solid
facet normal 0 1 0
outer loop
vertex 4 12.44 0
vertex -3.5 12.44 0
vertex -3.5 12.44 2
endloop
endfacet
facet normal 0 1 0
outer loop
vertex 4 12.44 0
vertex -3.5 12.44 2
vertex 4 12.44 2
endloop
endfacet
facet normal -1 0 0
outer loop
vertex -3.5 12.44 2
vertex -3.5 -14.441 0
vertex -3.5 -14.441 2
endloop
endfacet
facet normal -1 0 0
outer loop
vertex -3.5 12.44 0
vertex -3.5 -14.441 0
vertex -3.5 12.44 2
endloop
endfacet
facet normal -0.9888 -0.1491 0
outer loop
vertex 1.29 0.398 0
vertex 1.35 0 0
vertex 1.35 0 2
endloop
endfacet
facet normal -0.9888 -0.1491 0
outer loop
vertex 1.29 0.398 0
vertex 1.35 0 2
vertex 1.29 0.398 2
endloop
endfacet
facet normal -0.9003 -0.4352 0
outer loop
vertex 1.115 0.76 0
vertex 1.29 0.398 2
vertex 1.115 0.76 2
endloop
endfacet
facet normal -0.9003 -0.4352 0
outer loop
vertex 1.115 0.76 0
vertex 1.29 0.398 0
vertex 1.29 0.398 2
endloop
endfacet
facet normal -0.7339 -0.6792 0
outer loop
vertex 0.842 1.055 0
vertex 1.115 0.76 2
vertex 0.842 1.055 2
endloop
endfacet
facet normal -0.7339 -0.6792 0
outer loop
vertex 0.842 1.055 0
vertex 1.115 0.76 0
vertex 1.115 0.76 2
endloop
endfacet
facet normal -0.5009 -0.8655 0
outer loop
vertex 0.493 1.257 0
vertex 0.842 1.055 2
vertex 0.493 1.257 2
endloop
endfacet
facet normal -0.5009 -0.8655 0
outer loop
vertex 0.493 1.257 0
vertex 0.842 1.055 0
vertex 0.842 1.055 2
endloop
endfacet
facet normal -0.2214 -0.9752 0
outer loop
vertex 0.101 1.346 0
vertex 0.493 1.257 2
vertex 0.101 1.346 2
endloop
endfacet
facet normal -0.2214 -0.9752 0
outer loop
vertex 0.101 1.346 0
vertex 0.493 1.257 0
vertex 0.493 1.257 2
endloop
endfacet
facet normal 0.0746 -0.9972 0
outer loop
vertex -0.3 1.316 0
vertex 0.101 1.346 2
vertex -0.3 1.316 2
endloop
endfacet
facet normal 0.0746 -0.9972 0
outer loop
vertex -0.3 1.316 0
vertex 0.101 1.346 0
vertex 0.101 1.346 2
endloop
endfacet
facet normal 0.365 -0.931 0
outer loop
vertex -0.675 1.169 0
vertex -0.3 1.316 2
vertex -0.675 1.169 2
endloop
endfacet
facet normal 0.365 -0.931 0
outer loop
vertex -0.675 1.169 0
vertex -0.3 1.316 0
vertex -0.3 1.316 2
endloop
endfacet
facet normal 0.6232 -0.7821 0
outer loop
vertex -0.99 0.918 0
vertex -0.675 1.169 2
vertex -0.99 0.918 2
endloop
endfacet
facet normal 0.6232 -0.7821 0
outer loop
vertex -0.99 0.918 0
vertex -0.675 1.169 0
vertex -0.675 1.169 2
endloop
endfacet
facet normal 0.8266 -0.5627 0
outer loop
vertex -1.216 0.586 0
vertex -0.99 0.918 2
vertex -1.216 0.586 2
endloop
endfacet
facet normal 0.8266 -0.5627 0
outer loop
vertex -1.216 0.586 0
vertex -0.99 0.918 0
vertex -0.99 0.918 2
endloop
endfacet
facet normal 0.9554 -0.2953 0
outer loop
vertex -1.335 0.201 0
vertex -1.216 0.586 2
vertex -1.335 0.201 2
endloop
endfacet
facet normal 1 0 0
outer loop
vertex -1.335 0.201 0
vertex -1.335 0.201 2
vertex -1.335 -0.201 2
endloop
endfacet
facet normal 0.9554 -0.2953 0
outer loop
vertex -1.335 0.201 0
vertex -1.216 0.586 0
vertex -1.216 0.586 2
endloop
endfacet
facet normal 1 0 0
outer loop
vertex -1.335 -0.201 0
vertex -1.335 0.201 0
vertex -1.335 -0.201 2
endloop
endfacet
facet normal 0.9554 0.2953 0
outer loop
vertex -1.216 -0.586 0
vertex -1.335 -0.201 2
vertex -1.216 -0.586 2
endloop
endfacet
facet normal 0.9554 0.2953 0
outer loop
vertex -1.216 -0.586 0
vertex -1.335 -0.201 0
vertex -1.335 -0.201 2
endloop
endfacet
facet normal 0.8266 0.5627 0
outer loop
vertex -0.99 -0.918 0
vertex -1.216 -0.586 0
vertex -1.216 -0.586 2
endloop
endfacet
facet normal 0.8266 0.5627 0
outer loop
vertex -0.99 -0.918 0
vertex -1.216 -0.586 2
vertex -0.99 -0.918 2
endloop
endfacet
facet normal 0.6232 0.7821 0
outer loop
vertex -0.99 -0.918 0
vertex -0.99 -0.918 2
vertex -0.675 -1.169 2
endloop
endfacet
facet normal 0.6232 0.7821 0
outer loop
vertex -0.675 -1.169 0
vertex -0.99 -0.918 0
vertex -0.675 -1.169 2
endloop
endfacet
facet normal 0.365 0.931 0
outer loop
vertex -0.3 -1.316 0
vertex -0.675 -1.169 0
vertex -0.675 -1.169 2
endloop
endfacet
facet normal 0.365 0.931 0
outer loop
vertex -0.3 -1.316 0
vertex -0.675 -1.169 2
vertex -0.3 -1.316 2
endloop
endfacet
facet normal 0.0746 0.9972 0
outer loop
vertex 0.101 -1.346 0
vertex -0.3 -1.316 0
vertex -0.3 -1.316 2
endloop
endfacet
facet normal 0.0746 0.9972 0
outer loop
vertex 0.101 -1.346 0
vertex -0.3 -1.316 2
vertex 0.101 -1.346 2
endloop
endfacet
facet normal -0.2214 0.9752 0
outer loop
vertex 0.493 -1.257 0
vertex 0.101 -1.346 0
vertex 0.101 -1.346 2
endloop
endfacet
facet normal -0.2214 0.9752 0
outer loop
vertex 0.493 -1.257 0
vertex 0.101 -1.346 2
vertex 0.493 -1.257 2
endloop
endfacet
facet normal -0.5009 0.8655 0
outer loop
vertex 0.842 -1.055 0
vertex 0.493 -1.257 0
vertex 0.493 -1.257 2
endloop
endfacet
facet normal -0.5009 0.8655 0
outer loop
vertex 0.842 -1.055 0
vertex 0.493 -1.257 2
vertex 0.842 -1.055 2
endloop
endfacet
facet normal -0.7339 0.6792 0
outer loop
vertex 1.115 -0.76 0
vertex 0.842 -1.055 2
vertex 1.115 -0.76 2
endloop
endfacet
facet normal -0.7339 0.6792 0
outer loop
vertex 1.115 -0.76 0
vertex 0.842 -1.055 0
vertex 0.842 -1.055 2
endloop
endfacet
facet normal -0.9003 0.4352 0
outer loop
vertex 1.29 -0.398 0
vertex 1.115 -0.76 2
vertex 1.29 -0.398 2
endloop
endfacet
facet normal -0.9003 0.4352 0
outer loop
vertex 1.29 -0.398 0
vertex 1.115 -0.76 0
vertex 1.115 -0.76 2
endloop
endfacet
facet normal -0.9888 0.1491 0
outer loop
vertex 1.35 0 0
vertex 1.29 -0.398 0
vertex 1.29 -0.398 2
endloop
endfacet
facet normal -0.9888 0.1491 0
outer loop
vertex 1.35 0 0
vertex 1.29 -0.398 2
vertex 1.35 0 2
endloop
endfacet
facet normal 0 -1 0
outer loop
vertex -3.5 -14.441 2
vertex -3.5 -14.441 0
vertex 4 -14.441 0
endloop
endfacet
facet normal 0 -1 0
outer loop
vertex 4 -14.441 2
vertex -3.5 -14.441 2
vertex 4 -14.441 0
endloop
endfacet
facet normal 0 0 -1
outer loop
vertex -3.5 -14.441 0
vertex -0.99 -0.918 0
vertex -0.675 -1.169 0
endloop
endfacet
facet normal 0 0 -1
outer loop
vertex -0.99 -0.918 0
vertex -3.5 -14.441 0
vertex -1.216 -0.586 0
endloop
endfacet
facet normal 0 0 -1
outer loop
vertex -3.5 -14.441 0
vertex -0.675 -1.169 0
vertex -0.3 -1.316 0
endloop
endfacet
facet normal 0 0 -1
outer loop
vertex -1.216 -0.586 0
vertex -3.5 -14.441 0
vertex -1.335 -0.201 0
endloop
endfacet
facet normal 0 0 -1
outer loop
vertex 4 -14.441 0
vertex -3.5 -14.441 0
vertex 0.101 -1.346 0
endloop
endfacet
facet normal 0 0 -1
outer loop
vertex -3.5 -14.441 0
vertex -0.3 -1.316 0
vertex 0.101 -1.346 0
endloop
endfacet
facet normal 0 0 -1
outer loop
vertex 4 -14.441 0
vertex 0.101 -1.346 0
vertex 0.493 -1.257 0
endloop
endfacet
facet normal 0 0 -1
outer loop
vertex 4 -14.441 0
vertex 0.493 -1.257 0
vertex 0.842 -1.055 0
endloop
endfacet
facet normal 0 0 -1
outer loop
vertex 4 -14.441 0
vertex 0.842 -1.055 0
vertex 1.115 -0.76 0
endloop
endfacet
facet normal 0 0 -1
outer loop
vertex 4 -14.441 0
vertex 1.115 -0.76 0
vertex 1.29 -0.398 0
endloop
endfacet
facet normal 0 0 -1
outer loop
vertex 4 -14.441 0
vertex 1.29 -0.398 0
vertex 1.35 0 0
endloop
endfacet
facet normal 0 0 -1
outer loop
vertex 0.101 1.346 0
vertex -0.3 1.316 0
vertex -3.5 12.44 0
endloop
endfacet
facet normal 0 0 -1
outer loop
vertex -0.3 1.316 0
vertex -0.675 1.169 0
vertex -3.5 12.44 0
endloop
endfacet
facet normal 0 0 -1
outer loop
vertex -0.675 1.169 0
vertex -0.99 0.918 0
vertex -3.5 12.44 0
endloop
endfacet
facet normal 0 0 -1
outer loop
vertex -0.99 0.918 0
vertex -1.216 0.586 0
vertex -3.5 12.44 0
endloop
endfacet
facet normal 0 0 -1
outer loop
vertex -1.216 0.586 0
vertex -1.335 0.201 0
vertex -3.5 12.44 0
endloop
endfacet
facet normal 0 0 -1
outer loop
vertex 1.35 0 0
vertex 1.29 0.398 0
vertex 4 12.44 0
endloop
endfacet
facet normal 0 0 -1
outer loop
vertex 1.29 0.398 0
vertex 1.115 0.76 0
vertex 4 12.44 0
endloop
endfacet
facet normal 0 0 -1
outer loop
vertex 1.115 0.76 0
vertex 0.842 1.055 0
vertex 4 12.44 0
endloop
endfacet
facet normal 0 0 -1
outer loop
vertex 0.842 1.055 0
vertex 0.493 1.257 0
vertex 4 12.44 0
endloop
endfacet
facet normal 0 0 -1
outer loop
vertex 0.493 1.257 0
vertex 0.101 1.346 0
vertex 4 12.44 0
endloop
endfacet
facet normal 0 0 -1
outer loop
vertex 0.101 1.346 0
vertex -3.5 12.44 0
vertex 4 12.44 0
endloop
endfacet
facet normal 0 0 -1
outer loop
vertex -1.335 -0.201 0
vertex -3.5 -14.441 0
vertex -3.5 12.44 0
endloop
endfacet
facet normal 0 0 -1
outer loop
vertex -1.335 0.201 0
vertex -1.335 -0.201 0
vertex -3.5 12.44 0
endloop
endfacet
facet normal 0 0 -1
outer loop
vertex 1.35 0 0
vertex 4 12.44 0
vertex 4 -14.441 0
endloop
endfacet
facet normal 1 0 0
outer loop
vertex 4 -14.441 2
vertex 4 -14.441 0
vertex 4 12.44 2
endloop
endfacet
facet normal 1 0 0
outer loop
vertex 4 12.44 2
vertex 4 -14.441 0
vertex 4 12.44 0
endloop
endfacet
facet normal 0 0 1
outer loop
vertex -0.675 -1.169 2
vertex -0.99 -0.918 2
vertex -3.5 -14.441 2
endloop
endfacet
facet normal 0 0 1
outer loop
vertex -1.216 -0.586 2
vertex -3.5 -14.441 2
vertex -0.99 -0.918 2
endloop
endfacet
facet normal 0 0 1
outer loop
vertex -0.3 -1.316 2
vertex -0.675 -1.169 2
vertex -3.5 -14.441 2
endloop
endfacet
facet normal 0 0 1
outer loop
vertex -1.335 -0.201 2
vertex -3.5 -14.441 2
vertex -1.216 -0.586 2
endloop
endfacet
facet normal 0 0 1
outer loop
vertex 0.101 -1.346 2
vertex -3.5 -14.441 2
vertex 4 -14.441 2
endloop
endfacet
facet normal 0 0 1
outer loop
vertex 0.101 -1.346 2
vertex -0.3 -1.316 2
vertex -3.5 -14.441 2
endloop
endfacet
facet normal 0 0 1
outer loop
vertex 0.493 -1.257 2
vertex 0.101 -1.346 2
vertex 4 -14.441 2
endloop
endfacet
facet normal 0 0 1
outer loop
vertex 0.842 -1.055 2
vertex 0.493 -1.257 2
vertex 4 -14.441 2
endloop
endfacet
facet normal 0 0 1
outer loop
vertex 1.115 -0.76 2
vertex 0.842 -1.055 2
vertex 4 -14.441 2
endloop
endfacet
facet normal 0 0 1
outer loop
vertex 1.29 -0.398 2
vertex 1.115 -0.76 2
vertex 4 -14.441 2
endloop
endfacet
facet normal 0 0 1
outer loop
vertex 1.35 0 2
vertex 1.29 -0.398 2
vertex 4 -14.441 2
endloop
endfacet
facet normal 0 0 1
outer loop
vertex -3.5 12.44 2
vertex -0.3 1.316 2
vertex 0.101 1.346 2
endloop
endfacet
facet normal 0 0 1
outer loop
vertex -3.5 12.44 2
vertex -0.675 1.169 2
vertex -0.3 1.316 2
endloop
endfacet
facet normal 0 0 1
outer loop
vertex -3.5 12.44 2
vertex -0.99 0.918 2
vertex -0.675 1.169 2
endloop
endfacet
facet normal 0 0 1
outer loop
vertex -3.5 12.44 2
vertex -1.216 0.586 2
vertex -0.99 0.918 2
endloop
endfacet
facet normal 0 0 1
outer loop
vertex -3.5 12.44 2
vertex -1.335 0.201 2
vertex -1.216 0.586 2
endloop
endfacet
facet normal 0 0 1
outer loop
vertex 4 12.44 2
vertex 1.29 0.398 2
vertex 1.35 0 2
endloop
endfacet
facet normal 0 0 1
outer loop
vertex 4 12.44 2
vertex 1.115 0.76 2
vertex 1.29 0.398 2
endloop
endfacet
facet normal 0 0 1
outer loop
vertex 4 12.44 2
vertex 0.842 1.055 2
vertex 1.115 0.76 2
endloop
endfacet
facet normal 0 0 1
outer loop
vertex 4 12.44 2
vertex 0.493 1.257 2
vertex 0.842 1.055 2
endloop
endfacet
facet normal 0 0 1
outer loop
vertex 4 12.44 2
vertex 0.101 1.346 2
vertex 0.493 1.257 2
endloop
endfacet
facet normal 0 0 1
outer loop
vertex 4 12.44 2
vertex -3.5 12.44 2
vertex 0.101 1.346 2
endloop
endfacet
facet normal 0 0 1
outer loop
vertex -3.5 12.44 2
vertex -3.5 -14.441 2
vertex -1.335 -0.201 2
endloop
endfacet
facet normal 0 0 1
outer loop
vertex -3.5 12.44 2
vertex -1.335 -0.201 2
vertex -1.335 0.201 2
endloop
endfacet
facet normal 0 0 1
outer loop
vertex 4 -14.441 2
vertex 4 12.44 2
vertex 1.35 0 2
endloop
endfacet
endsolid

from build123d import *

# Parameters (mm, degrees)
SKETCH1_W           = 7.5
SKETCH1_H           = 26.881
SKETCH1_R           = 1.35
BOSS_EXTRUDE1_DEPTH = 2


with BuildPart() as part:
    # Sketch1 → Boss-Extrude1 (new body)
    with BuildSketch(Plane.XY):
        with Locations((0.25, -1.0005)):
            Rectangle(SKETCH1_W, SKETCH1_H)
        Circle(SKETCH1_R, mode=Mode.SUBTRACT)
    extrude(amount=BOSS_EXTRUDE1_DEPTH)


solid = part.part
